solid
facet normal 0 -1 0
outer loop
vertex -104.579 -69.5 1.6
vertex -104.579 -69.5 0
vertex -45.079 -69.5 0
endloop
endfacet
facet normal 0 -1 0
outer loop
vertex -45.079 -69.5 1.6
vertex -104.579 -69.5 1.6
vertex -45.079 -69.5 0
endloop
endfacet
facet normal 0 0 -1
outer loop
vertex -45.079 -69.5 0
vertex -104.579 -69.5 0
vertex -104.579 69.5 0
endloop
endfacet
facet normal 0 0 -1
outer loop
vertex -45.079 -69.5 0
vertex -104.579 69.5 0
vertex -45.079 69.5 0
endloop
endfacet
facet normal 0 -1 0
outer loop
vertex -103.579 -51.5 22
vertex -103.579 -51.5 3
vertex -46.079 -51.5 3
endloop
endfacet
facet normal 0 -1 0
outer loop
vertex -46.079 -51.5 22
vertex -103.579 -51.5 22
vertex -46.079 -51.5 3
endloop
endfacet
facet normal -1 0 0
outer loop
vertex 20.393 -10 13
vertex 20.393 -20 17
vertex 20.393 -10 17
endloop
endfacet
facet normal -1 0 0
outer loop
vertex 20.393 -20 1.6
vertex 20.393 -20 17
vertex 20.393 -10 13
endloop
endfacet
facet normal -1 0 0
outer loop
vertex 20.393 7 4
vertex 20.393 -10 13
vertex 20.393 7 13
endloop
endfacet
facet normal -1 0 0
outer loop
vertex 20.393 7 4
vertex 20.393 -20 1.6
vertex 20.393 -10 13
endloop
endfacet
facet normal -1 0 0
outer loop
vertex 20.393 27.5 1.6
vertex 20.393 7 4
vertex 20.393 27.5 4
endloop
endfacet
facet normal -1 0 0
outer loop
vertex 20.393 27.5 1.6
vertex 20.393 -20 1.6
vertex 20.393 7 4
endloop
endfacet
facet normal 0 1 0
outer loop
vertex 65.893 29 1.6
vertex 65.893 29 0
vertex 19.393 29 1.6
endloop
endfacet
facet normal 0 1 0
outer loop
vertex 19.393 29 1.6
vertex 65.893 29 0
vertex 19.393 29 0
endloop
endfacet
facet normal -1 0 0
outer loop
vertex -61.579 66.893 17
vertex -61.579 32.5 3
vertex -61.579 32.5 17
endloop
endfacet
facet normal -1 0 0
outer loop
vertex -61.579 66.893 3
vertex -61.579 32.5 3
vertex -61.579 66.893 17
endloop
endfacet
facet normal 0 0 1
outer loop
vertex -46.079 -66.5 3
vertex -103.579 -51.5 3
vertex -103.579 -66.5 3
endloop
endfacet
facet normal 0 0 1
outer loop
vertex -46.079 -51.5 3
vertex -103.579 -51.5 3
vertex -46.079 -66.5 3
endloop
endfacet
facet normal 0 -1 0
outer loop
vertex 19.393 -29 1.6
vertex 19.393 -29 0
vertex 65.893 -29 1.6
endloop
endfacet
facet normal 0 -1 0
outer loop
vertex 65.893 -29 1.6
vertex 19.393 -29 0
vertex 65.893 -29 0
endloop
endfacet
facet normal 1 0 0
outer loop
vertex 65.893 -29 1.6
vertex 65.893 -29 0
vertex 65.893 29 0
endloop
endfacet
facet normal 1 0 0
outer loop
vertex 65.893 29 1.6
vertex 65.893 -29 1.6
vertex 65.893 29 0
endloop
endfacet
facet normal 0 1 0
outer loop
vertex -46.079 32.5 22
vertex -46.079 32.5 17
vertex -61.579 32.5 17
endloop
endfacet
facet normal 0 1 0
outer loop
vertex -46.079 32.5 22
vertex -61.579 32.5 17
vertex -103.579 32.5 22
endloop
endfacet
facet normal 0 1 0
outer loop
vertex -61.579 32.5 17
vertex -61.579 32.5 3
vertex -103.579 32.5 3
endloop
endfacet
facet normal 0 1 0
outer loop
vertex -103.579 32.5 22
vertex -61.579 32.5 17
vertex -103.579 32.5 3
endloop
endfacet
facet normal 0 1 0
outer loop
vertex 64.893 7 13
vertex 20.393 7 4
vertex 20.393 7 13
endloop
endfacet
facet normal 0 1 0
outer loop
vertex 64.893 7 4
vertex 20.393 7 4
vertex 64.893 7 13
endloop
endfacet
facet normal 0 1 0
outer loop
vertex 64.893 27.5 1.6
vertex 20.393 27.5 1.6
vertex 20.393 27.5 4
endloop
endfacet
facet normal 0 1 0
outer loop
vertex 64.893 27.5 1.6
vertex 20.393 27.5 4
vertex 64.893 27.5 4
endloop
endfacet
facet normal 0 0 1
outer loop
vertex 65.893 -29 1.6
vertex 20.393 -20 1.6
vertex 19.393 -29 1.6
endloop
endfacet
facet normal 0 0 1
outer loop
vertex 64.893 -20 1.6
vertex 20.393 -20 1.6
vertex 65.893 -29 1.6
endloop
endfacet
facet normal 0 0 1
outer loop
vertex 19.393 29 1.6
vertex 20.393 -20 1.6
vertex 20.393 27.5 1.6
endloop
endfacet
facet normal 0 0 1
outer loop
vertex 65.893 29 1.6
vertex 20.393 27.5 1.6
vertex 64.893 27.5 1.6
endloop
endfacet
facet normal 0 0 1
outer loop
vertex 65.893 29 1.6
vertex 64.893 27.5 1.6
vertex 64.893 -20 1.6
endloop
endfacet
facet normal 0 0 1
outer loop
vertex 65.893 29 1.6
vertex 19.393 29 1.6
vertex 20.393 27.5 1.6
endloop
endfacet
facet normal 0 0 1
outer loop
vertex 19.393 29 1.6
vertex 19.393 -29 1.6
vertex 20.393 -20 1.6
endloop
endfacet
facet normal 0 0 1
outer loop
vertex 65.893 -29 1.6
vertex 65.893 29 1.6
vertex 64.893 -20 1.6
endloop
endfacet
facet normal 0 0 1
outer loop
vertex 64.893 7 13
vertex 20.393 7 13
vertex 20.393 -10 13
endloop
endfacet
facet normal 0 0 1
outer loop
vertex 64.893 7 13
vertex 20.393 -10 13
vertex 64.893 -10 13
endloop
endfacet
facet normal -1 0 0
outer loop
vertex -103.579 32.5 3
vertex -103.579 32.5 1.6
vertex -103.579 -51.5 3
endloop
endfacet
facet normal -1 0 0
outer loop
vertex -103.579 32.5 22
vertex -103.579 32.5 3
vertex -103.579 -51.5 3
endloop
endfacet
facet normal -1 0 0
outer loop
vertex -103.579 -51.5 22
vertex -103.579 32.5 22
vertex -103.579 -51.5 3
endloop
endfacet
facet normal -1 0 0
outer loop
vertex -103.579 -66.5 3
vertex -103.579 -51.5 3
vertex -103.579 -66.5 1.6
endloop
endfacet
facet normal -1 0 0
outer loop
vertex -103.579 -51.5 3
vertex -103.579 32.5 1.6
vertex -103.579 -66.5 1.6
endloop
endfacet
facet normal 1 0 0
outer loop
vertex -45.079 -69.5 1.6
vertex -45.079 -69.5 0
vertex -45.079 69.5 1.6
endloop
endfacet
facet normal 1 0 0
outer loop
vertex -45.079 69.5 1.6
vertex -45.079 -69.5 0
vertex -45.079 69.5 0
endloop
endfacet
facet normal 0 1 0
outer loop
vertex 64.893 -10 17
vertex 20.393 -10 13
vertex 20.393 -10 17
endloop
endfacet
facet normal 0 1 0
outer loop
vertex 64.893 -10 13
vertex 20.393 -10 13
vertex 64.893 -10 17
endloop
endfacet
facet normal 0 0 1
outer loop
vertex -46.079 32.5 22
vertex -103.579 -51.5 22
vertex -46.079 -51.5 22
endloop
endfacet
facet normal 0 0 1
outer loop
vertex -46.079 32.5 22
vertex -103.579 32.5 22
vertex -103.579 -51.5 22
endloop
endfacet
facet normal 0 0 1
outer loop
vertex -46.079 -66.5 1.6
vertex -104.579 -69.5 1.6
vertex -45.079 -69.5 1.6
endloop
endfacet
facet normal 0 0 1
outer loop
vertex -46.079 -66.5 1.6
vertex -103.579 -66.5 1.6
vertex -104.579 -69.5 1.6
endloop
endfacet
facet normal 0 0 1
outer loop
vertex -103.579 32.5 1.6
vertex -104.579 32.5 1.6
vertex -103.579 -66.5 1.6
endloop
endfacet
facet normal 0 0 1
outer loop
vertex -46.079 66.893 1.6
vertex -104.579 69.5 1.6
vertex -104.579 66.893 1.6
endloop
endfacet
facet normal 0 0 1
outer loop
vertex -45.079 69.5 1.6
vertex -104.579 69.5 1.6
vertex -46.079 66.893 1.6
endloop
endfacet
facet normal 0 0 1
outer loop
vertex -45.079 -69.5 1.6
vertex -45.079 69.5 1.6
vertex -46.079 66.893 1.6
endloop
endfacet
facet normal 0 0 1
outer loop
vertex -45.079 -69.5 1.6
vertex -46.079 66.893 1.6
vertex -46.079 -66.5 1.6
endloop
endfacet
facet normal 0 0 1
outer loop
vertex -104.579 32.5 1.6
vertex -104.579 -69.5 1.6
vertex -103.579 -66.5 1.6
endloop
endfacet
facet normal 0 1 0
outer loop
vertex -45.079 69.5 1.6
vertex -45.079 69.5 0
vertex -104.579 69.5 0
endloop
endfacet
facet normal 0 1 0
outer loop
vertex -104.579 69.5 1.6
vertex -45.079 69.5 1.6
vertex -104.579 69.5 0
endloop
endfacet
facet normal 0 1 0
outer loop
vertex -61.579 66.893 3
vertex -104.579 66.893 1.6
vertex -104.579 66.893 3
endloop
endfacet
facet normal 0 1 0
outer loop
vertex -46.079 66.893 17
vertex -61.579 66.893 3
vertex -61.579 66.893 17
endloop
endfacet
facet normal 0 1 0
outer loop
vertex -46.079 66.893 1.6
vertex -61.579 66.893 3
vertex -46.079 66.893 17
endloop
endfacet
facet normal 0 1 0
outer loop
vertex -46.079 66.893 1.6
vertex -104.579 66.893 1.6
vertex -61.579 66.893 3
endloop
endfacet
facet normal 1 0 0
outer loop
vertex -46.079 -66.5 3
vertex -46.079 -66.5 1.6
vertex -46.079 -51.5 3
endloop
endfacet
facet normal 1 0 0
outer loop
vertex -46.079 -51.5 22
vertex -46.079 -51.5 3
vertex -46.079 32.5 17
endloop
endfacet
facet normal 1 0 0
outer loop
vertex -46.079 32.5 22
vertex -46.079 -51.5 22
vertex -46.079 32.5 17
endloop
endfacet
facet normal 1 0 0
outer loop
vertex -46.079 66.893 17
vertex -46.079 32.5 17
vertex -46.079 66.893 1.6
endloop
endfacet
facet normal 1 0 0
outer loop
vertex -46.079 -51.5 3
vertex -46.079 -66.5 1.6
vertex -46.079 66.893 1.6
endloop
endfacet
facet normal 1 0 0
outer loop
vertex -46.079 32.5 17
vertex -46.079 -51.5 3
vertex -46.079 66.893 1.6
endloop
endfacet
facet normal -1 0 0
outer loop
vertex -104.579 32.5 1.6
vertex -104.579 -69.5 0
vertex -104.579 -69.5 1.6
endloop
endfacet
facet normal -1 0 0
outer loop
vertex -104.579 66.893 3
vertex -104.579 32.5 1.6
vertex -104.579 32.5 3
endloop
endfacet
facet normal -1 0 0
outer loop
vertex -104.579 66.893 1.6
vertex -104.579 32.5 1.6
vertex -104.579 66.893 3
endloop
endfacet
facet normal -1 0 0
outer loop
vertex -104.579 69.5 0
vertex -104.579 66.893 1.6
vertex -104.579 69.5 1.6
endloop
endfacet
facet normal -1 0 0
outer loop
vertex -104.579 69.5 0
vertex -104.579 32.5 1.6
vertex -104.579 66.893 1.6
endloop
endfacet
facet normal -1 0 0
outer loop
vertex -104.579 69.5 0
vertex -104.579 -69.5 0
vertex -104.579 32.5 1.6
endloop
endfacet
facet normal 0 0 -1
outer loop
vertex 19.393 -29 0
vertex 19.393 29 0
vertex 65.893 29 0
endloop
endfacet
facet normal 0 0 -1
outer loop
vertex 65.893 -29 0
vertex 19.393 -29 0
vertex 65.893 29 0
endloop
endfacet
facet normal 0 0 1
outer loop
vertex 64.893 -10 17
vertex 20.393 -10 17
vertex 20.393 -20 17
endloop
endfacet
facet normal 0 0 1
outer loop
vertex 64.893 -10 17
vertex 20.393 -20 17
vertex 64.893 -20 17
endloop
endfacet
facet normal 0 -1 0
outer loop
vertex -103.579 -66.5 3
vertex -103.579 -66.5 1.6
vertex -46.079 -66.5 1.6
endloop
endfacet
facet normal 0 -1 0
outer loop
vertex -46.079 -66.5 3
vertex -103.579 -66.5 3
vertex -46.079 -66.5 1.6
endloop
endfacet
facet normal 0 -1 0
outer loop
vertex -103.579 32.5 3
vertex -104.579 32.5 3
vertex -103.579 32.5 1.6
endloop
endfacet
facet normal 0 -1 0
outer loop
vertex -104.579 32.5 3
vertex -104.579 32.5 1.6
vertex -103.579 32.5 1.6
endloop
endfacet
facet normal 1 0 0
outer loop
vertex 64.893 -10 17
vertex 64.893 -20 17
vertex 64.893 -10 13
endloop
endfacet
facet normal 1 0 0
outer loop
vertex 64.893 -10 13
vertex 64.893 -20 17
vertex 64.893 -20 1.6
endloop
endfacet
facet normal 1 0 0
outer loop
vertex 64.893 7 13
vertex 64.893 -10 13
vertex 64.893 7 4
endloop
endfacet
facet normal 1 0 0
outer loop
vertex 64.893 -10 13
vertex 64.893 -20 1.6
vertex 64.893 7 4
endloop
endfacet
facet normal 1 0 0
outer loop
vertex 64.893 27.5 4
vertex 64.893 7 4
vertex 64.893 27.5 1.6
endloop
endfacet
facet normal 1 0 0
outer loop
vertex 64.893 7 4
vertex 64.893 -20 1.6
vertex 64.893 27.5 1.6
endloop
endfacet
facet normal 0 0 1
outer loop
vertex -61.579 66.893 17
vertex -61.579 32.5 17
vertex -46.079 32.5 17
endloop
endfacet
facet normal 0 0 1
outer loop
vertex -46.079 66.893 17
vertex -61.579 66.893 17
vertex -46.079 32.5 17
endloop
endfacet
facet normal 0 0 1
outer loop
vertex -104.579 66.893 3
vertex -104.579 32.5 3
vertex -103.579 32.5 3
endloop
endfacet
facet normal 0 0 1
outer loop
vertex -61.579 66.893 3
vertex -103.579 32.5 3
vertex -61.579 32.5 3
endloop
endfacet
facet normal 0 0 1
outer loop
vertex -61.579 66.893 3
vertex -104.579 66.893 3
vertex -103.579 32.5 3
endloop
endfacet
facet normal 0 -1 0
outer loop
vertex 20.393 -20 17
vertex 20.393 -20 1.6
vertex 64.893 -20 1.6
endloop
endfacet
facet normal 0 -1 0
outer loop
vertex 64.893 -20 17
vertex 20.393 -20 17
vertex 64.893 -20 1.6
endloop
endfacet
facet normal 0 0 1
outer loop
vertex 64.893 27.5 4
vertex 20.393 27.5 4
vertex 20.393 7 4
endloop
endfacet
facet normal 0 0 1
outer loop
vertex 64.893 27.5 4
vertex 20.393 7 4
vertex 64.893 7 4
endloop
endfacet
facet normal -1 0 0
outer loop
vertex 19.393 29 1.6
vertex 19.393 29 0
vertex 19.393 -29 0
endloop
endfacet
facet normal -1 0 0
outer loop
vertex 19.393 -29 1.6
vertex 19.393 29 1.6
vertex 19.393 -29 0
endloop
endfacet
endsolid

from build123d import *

# Parameters (mm, degrees)
F0_W     = 1
F0_H     = 2.6073388457
F0_H_2   = 3
F0_W_2   = 57.5
F0_H_3   = 84
F0_H_4   = 15
F0_H_5   = 34.3926611543
F1_DEPTH = 1.6
F0_H_6   = 1.5
F0_W_3   = 44.5
F0_H_7   = 9
F0_H_8   = 20.5
F0_H_9   = 17
F0_H_10  = 10
F0_W_4   = 42
F2_DEPTH = 3
F0_W_5   = 15.5
F3_DEPTH = 17
F4_DEPTH = 22
F5_DEPTH = 4
F6_DEPTH = 13


with BuildPart() as f1:
    # F0 (on Top) → F1 (new body)
    with BuildSketch(Plane.XY):
        with Locations((-45.5788407922, 68.1963305771)):
            Rectangle(F0_W, F0_H)
        Polygon((-61.5788407922, 66.8926611543), (-46.0788407922, 66.8926611543), (-46.0788407922, 69.5), (-103.5788407922, 69.5), (-103.5788407922, 66.8926611543), align=None)
        with Locations((-104.0788407922, 68.1963305771)):
            Rectangle(F0_W, F0_H)
        with Locations((-45.5788407922, -68)):
            Rectangle(F0_W, F0_H_2)
        with Locations((-74.8288407922, -68)):
            Rectangle(F0_W_2, F0_H_2)
        with Locations((-104.0788407922, -68)):
            Rectangle(F0_W, F0_H_2)
        with Locations((-104.0788407922, -9.5)):
            Rectangle(F0_W, F0_H_3)
        with Locations((-104.0788407922, -59)):
            Rectangle(F0_W, F0_H_4)
        with Locations((-45.5788407922, -59)):
            Rectangle(F0_W, F0_H_4)
        with Locations((-45.5788407922, -9.5)):
            Rectangle(F0_W, F0_H_3)
        with Locations((-45.5788407922, 49.6963305771)):
            Rectangle(F0_W, F0_H_5)
    extrude(amount=F1_DEPTH)

    # F0 (on Top) → F2 (join)
    with BuildSketch(Plane.XY):
        with Locations((-74.8288407922, -59)):
            Rectangle(F0_W_2, F0_H_4)
        with Locations((-104.0788407922, 49.6963305771)):
            Rectangle(F0_W, F0_H_5)
        with Locations((-82.5788407922, 49.6963305771)):
            Rectangle(F0_W_4, F0_H_5)
    extrude(amount=F2_DEPTH)

    # F0 (on Top) → F3 (join)
    with BuildSketch(Plane.XY):
        with Locations((-53.8288407922, 49.6963305771)):
            Rectangle(F0_W_5, F0_H_5)
    extrude(amount=F3_DEPTH)

    # F0 (on Top) → F4 (join)
    with BuildSketch(Plane.XY):
        Polygon((-103.5788407922, -51.5), (-46.0788407922, -51.5), (-46.0788407922, 32.5), (-61.5788407922, 32.5), (-103.5788407922, 32.5), align=None)
    extrude(amount=F4_DEPTH)


with BuildPart() as f1b:
    # F0 (on Top) → F1, piece 2 (new body)
    with BuildSketch(Plane.XY):
        with Locations((65.3926380873, 28.25)):
            Rectangle(F0_W, F0_H_6)
        with Locations((42.6426380873, 28.25)):
            Rectangle(F0_W_3, F0_H_6)
        with Locations((19.8926380873, 28.25)):
            Rectangle(F0_W, F0_H_6)
        with Locations((65.3926380873, -24.5)):
            Rectangle(F0_W, F0_H_7)
        with Locations((42.6426380873, -24.5)):
            Rectangle(F0_W_3, F0_H_7)
        with Locations((19.8926380873, -24.5)):
            Rectangle(F0_W, F0_H_7)
        with Locations((19.8926380873, 17.25)):
            Rectangle(F0_W, F0_H_8)
        with Locations((19.8926380873, -1.5)):
            Rectangle(F0_W, F0_H_9)
        with Locations((19.8926380873, -15)):
            Rectangle(F0_W, F0_H_10)
        with Locations((65.3926380873, -15)):
            Rectangle(F0_W, F0_H_10)
        with Locations((65.3926380873, -1.5)):
            Rectangle(F0_W, F0_H_9)
        with Locations((65.3926380873, 17.25)):
            Rectangle(F0_W, F0_H_8)
    extrude(amount=F1_DEPTH)

    # F0 (on Top) → F3, piece 2 (join)
    with BuildSketch(Plane.XY):
        with Locations((42.6426380873, -15)):
            Rectangle(F0_W_3, F0_H_10)
    extrude(amount=F3_DEPTH)

    # F0 (on Top) → F5 (join)
    with BuildSketch(Plane.XY):
        with Locations((42.6426380873, 17.25)):
            Rectangle(F0_W_3, F0_H_8)
    extrude(amount=F5_DEPTH)

    # F0 (on Top) → F6 (join)
    with BuildSketch(Plane.XY):
        with Locations((42.6426380873, -1.5)):
            Rectangle(F0_W_3, F0_H_9)
    extrude(amount=F6_DEPTH)


solid = Compound([f1.part, f1b.part])
